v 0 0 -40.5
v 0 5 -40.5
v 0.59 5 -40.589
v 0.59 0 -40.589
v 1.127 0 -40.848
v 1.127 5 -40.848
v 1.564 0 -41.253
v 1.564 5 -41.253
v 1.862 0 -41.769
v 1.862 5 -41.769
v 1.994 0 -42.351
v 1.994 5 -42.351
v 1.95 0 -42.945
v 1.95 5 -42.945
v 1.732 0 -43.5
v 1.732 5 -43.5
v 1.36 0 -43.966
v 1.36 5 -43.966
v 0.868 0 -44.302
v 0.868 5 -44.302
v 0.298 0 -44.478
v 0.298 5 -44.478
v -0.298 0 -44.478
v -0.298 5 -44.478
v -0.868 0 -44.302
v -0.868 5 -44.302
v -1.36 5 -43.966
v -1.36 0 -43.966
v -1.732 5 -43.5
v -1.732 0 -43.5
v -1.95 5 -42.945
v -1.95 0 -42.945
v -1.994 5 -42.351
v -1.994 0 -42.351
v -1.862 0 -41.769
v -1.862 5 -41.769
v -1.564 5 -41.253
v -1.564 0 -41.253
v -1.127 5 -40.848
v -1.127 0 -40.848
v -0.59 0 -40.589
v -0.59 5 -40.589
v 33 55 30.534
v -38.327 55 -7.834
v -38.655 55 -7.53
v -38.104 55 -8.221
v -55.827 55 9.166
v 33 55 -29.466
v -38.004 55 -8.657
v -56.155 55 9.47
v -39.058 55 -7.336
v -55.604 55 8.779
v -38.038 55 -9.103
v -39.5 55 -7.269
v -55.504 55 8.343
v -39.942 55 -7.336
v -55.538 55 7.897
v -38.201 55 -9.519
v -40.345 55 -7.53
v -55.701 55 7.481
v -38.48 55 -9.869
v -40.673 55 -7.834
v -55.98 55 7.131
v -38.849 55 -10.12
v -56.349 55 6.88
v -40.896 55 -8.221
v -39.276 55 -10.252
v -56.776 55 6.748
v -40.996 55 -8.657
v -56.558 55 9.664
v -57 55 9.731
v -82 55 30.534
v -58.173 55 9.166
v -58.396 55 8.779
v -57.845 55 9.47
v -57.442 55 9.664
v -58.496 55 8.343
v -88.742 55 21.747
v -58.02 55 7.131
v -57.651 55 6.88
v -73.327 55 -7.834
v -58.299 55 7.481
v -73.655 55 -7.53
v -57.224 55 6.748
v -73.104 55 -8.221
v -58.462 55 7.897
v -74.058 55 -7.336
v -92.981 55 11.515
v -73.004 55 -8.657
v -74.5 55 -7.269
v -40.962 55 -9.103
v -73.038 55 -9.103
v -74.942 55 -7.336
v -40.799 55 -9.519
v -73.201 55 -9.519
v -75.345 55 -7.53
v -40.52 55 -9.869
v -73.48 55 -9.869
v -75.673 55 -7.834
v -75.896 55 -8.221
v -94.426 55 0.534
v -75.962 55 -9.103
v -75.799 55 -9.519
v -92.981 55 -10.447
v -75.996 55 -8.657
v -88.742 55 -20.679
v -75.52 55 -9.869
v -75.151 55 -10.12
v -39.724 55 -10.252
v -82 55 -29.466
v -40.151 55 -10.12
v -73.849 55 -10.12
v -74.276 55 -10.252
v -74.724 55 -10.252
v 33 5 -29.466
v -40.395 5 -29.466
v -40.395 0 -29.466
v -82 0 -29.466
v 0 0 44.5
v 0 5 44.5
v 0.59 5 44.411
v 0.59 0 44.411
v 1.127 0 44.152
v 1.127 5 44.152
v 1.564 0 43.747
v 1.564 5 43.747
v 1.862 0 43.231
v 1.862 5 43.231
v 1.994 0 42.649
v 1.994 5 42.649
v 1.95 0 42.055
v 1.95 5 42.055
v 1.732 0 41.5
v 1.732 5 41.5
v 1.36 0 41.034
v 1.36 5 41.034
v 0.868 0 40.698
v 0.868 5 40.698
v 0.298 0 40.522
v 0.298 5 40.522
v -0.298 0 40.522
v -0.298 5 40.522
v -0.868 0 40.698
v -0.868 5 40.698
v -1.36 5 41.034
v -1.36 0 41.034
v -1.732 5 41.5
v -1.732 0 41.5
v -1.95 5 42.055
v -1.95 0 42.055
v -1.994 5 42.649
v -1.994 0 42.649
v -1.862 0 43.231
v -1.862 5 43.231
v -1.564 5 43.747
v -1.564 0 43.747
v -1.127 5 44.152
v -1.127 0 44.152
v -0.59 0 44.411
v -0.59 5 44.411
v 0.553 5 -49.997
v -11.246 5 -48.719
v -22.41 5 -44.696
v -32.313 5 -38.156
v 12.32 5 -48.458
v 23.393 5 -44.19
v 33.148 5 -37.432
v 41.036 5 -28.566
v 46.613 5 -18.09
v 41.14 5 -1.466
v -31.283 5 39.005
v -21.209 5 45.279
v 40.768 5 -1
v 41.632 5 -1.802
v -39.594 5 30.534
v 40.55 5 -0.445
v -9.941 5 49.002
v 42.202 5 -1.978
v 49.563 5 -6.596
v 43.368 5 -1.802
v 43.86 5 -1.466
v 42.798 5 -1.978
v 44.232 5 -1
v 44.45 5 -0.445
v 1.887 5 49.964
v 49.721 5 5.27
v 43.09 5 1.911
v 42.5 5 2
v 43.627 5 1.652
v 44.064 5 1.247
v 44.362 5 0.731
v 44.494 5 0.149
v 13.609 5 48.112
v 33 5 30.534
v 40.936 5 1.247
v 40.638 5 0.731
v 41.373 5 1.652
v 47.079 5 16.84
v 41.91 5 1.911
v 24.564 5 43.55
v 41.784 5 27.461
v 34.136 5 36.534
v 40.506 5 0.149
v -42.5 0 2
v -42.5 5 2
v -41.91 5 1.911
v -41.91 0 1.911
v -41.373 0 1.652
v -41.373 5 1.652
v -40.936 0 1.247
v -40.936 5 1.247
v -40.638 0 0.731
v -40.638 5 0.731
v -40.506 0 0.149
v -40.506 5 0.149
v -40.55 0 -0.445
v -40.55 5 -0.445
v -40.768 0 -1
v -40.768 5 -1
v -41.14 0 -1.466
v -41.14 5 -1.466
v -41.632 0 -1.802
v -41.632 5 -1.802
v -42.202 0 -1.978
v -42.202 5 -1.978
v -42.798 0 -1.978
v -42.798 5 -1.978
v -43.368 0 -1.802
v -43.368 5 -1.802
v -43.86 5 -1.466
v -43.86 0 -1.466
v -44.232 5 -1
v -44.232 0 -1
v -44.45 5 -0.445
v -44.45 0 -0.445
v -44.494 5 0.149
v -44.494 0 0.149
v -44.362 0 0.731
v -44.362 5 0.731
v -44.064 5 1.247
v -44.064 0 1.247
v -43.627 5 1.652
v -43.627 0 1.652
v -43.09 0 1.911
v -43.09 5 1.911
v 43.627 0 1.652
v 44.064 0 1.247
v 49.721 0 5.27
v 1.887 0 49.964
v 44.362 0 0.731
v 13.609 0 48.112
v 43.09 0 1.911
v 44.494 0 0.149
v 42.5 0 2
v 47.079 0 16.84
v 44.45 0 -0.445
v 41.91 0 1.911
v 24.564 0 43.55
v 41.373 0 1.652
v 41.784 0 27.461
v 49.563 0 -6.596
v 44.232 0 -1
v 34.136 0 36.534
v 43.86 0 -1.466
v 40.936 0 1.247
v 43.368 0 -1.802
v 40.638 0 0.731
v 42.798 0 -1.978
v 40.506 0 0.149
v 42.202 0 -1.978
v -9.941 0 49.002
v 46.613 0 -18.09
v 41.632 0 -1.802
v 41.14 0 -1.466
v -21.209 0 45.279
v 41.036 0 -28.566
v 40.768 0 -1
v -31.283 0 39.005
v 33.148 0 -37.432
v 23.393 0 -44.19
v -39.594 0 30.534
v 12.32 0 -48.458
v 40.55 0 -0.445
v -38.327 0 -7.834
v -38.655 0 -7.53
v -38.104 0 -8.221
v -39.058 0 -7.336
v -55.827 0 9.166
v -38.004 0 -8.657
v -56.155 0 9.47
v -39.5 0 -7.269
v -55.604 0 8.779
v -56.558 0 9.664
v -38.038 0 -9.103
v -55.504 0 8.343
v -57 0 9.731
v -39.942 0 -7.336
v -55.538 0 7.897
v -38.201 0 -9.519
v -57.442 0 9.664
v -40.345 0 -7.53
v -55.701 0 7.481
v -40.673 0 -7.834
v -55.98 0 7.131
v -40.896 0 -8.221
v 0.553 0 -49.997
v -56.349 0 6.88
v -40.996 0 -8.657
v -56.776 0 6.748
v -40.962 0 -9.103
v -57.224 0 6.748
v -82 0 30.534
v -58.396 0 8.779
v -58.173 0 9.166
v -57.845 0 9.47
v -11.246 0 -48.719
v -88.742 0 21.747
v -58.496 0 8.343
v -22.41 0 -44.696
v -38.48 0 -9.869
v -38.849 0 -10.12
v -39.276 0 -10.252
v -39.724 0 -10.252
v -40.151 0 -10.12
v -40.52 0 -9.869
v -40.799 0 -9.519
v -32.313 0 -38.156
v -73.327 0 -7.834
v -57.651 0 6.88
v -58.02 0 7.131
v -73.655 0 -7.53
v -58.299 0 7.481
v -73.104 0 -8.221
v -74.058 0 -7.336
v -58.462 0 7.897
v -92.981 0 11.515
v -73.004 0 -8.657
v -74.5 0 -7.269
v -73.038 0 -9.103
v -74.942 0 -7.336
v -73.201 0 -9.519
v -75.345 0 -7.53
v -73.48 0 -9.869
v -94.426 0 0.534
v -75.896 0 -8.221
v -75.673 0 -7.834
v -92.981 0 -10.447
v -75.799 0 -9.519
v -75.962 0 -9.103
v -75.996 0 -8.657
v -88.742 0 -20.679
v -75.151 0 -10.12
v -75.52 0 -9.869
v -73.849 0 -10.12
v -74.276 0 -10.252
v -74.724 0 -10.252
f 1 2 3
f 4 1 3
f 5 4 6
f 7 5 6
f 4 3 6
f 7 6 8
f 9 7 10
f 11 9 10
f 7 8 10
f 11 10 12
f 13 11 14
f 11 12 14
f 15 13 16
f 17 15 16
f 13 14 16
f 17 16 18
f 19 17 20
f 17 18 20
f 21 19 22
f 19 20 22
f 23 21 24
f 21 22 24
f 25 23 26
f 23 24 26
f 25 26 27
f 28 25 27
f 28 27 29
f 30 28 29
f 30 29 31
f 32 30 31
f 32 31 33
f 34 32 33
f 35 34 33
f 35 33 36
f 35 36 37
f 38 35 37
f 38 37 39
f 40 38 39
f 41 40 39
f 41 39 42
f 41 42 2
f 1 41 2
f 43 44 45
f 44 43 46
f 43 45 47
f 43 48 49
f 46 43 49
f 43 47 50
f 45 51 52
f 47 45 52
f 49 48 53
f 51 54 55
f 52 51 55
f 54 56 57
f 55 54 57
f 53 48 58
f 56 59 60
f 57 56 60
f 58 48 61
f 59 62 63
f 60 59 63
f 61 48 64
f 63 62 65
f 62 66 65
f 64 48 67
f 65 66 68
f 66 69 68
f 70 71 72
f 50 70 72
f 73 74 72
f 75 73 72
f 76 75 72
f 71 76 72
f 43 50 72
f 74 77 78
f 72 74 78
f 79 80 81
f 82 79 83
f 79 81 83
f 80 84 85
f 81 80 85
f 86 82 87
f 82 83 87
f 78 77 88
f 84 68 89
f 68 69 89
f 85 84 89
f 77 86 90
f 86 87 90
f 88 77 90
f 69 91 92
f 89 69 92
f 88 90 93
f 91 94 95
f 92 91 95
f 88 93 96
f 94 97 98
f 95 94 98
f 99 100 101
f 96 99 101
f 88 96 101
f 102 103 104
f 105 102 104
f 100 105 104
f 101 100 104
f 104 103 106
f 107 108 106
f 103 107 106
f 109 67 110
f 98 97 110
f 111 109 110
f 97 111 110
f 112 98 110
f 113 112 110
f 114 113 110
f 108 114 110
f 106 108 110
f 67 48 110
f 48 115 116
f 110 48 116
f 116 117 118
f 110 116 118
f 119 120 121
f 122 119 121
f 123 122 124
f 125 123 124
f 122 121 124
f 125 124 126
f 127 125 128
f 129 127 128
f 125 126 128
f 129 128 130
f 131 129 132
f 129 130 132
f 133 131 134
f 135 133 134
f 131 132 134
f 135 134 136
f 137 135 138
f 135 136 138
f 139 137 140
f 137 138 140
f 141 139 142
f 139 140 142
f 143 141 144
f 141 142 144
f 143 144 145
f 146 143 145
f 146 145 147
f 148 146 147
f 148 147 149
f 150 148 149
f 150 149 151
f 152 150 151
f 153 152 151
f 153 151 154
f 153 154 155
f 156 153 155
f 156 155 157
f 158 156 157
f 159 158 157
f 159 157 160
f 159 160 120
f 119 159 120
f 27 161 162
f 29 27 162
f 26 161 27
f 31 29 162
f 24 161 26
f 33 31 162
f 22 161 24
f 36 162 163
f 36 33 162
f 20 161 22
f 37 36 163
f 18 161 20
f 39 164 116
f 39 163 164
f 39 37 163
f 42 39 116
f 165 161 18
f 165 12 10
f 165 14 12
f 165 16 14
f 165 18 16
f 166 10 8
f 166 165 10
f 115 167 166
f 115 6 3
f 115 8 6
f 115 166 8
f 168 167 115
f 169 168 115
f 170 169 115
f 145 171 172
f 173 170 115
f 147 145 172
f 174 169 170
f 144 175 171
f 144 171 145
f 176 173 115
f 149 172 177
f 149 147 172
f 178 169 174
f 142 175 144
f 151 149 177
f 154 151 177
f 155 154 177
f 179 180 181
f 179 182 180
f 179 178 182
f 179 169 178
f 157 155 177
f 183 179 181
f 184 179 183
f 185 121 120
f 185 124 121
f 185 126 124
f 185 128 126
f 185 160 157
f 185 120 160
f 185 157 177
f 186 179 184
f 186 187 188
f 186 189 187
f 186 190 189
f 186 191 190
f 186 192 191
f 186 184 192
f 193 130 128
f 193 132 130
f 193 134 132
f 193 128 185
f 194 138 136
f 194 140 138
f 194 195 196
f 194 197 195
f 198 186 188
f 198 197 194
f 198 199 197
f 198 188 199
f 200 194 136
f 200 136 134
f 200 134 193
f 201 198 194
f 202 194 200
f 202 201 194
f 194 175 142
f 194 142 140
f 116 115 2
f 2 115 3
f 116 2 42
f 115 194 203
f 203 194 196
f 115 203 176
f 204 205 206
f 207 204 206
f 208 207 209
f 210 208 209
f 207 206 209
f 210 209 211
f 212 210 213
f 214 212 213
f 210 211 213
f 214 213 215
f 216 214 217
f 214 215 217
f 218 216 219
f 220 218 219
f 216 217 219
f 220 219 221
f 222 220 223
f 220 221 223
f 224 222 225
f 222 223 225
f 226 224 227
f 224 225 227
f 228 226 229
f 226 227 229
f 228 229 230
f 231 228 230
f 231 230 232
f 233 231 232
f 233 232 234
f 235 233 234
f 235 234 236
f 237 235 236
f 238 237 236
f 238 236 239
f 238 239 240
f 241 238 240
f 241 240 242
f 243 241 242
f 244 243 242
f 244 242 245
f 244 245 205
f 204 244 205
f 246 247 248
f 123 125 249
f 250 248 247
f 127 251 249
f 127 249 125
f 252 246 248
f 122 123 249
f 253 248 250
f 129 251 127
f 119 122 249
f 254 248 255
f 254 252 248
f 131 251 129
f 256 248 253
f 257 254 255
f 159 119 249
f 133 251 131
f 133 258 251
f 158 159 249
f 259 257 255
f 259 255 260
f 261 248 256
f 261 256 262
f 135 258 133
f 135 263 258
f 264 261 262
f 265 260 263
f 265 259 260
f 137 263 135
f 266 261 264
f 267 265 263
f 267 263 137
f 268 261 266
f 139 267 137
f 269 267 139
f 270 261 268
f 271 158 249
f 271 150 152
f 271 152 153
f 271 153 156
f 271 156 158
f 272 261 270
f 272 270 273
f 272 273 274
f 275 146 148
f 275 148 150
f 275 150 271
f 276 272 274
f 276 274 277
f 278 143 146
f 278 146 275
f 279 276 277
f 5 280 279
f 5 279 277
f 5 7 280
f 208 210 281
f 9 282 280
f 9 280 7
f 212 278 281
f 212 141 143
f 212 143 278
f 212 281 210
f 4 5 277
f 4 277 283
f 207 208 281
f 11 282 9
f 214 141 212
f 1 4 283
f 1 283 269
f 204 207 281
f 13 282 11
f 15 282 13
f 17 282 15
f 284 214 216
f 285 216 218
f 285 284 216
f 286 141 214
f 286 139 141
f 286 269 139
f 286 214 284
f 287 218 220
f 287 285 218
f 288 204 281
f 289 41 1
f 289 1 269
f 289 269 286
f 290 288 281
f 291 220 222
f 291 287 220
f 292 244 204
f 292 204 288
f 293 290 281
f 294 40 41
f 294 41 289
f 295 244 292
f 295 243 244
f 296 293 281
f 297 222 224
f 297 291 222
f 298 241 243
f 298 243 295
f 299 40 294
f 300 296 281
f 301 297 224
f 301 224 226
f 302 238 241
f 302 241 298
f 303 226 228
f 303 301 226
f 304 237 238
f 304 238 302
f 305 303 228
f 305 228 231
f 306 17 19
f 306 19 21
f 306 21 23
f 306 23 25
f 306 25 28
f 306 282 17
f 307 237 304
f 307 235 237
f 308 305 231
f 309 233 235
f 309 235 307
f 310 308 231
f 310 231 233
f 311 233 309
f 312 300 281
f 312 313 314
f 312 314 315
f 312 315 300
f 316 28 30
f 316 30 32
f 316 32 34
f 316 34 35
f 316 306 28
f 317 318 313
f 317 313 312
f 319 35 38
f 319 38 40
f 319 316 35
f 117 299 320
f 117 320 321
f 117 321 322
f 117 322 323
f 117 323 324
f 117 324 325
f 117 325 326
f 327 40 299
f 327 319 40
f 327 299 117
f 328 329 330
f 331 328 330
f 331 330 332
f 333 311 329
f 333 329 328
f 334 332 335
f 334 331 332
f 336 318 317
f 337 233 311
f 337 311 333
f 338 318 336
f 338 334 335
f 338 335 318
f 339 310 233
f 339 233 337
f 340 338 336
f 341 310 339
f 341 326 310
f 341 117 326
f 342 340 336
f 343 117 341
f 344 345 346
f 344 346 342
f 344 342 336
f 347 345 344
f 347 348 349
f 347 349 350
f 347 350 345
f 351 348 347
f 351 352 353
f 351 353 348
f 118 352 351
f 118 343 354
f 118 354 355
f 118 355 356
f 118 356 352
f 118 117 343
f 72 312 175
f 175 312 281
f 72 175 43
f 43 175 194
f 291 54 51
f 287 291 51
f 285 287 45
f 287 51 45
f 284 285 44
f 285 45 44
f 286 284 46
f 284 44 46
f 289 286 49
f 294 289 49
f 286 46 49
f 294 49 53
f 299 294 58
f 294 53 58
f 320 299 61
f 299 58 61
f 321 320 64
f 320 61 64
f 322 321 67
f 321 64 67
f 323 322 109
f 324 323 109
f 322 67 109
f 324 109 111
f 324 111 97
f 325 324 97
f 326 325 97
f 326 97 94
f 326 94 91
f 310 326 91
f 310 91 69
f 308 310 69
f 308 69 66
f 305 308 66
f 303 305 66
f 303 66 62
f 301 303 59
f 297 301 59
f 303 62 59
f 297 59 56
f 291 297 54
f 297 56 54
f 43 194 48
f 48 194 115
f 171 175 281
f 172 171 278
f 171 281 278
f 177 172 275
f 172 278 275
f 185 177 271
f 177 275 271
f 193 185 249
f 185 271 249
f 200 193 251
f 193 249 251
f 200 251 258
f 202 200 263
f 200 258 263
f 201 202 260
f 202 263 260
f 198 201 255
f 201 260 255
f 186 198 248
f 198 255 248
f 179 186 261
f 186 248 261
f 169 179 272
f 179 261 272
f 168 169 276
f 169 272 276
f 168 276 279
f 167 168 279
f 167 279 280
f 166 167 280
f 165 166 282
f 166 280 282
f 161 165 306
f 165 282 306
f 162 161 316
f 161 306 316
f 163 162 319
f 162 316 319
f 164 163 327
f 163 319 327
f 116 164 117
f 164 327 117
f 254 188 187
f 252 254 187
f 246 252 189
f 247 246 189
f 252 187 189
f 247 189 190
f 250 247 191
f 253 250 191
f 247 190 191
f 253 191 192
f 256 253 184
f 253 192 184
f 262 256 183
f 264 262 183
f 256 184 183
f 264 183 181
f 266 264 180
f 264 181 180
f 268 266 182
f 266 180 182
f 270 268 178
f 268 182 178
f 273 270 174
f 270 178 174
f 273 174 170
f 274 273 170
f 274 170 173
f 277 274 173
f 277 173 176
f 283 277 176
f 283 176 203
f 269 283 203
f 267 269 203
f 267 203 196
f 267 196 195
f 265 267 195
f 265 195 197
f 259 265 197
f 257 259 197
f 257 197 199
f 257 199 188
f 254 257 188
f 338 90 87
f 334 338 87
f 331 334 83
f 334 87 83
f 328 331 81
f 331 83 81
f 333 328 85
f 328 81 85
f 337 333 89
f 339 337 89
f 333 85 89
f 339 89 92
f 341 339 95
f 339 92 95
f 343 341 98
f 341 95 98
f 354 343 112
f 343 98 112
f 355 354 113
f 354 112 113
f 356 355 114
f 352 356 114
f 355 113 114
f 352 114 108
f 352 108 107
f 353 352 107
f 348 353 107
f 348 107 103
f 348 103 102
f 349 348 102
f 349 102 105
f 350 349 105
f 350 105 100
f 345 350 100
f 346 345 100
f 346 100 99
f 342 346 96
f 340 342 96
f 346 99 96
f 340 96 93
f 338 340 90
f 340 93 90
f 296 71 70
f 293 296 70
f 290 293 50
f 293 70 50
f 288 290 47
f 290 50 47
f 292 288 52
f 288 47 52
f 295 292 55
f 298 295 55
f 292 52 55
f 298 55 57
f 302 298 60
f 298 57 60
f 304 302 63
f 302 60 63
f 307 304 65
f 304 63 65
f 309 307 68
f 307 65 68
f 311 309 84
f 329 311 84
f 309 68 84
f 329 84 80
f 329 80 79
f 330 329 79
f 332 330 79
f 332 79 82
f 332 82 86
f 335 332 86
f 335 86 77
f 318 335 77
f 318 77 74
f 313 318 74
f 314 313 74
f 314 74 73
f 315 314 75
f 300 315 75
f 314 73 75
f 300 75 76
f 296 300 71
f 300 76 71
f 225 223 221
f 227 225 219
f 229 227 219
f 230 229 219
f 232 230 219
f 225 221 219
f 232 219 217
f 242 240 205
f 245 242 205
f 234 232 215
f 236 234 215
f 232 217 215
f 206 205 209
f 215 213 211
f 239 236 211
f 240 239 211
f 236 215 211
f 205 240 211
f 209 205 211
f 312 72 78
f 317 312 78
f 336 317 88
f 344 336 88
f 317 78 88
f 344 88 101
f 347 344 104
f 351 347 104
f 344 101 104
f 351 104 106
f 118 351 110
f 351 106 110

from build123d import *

# Parameters (mm, degrees)
SKETCH1_R                = 50
BOSS_EXTRUDE1_DEPTH      = 5
BOSS_EXTRUDE2_DEPTH      = 50
BOSS_EXTRUDE2_DEPTH_BACK = 5
SKETCH3_R                = 2
CUT_EXTRUDE1_DEPTH       = 50
BOSS_EXTRUDE3_DEPTH      = 55
SKETCH5_R                = 1.5
CUT_EXTRUDE2_DEPTH       = 55


with BuildPart() as part:
    # Sketch1 → Boss-Extrude1 (new body)
    with BuildSketch(Plane(origin=(0, 0, 0), x_dir=(1, 0, 0), z_dir=(0, 1, 0))):
        with Locations(Location((0, 0, 0), (0, 0, 270))):
            Circle(SKETCH1_R)
    extrude(amount=BOSS_EXTRUDE1_DEPTH)

    # Sketch2 → Boss-Extrude2 (add, two sides: drawn at the far end of the back side and taken through both)
    with BuildSketch(Plane(origin=(0, 5, 0), x_dir=(1, 0, 0), z_dir=(0, 1, 0)).offset(-BOSS_EXTRUDE2_DEPTH_BACK)):
        with BuildLine():
            ThreePointArc((-40.394880662, 29.46614356), (-49.995546188, -0.667353994), (-39.593984529, -30.53385644))
            Line((-39.593984529, -30.53385644), (33, -30.53385644))
            Line((33, -30.53385644), (33, 29.46614356))
            Line((33, 29.46614356), (-40.394880662, 29.46614356))
        make_face()
        with BuildLine():
            Line((-82, 29.46614356), (-82, -30.53385644))
            Line((-82, -30.53385644), (-39.593984529, -30.53385644))
            ThreePointArc((-39.593984529, -30.53385644), (-49.995546188, -0.667353994), (-40.394880662, 29.46614356))
            Line((-40.394880662, 29.46614356), (-82, 29.46614356))
        make_face()
    extrude(amount=BOSS_EXTRUDE2_DEPTH + BOSS_EXTRUDE2_DEPTH_BACK)

    # Sketch3 → Cut-Extrude1 (cut)
    with BuildSketch(Plane(origin=(0, 5, 0), x_dir=(1, 0, 0), z_dir=(0, 1, 0))):
        with Locations(Location((0, -42.5, 0), (0, 0, 270))):
            Circle(SKETCH3_R)
        with Locations(Location((-42.5, 0, 0), (0, 0, 270))):
            Circle(SKETCH3_R)
        with Locations(Location((0, 42.5, 0), (0, 0, 270))):
            Circle(SKETCH3_R)
        with Locations(Location((42.5, 0, 0), (0, 0, 270))):
            Circle(SKETCH3_R)
    extrude(amount=-CUT_EXTRUDE1_DEPTH, mode=Mode.SUBTRACT)

    # Sketch4 → Boss-Extrude3 (add)
    with BuildSketch(Plane(origin=(0, 55, 0), x_dir=(1, 0, 0), z_dir=(0, 1, 0))):
        with BuildLine():
            Line((-82, 29.46614356), (-82, -30.53385644))
            ThreePointArc((-82, -30.53385644), (-94.426406871, -0.53385644), (-82, 29.46614356))
        make_face()
    extrude(amount=-BOSS_EXTRUDE3_DEPTH)

    # Sketch5 → Cut-Extrude2 (cut)
    with BuildSketch(Plane(origin=(0, 55, 0), x_dir=(1, 0, 0), z_dir=(0, 1, 0))):
        with Locations(Location((-74.5, 8.768970361, 0), (0, 0, 270))):
            Circle(SKETCH5_R)
        with Locations(Location((-39.5, 8.768970361, 0), (0, 0, 270))):
            Circle(SKETCH5_R)
        with Locations(Location((-57, -8.231029639, 0), (0, 0, 270))):
            Circle(SKETCH5_R)
    extrude(amount=-CUT_EXTRUDE2_DEPTH, mode=Mode.SUBTRACT)


solid = part.part
